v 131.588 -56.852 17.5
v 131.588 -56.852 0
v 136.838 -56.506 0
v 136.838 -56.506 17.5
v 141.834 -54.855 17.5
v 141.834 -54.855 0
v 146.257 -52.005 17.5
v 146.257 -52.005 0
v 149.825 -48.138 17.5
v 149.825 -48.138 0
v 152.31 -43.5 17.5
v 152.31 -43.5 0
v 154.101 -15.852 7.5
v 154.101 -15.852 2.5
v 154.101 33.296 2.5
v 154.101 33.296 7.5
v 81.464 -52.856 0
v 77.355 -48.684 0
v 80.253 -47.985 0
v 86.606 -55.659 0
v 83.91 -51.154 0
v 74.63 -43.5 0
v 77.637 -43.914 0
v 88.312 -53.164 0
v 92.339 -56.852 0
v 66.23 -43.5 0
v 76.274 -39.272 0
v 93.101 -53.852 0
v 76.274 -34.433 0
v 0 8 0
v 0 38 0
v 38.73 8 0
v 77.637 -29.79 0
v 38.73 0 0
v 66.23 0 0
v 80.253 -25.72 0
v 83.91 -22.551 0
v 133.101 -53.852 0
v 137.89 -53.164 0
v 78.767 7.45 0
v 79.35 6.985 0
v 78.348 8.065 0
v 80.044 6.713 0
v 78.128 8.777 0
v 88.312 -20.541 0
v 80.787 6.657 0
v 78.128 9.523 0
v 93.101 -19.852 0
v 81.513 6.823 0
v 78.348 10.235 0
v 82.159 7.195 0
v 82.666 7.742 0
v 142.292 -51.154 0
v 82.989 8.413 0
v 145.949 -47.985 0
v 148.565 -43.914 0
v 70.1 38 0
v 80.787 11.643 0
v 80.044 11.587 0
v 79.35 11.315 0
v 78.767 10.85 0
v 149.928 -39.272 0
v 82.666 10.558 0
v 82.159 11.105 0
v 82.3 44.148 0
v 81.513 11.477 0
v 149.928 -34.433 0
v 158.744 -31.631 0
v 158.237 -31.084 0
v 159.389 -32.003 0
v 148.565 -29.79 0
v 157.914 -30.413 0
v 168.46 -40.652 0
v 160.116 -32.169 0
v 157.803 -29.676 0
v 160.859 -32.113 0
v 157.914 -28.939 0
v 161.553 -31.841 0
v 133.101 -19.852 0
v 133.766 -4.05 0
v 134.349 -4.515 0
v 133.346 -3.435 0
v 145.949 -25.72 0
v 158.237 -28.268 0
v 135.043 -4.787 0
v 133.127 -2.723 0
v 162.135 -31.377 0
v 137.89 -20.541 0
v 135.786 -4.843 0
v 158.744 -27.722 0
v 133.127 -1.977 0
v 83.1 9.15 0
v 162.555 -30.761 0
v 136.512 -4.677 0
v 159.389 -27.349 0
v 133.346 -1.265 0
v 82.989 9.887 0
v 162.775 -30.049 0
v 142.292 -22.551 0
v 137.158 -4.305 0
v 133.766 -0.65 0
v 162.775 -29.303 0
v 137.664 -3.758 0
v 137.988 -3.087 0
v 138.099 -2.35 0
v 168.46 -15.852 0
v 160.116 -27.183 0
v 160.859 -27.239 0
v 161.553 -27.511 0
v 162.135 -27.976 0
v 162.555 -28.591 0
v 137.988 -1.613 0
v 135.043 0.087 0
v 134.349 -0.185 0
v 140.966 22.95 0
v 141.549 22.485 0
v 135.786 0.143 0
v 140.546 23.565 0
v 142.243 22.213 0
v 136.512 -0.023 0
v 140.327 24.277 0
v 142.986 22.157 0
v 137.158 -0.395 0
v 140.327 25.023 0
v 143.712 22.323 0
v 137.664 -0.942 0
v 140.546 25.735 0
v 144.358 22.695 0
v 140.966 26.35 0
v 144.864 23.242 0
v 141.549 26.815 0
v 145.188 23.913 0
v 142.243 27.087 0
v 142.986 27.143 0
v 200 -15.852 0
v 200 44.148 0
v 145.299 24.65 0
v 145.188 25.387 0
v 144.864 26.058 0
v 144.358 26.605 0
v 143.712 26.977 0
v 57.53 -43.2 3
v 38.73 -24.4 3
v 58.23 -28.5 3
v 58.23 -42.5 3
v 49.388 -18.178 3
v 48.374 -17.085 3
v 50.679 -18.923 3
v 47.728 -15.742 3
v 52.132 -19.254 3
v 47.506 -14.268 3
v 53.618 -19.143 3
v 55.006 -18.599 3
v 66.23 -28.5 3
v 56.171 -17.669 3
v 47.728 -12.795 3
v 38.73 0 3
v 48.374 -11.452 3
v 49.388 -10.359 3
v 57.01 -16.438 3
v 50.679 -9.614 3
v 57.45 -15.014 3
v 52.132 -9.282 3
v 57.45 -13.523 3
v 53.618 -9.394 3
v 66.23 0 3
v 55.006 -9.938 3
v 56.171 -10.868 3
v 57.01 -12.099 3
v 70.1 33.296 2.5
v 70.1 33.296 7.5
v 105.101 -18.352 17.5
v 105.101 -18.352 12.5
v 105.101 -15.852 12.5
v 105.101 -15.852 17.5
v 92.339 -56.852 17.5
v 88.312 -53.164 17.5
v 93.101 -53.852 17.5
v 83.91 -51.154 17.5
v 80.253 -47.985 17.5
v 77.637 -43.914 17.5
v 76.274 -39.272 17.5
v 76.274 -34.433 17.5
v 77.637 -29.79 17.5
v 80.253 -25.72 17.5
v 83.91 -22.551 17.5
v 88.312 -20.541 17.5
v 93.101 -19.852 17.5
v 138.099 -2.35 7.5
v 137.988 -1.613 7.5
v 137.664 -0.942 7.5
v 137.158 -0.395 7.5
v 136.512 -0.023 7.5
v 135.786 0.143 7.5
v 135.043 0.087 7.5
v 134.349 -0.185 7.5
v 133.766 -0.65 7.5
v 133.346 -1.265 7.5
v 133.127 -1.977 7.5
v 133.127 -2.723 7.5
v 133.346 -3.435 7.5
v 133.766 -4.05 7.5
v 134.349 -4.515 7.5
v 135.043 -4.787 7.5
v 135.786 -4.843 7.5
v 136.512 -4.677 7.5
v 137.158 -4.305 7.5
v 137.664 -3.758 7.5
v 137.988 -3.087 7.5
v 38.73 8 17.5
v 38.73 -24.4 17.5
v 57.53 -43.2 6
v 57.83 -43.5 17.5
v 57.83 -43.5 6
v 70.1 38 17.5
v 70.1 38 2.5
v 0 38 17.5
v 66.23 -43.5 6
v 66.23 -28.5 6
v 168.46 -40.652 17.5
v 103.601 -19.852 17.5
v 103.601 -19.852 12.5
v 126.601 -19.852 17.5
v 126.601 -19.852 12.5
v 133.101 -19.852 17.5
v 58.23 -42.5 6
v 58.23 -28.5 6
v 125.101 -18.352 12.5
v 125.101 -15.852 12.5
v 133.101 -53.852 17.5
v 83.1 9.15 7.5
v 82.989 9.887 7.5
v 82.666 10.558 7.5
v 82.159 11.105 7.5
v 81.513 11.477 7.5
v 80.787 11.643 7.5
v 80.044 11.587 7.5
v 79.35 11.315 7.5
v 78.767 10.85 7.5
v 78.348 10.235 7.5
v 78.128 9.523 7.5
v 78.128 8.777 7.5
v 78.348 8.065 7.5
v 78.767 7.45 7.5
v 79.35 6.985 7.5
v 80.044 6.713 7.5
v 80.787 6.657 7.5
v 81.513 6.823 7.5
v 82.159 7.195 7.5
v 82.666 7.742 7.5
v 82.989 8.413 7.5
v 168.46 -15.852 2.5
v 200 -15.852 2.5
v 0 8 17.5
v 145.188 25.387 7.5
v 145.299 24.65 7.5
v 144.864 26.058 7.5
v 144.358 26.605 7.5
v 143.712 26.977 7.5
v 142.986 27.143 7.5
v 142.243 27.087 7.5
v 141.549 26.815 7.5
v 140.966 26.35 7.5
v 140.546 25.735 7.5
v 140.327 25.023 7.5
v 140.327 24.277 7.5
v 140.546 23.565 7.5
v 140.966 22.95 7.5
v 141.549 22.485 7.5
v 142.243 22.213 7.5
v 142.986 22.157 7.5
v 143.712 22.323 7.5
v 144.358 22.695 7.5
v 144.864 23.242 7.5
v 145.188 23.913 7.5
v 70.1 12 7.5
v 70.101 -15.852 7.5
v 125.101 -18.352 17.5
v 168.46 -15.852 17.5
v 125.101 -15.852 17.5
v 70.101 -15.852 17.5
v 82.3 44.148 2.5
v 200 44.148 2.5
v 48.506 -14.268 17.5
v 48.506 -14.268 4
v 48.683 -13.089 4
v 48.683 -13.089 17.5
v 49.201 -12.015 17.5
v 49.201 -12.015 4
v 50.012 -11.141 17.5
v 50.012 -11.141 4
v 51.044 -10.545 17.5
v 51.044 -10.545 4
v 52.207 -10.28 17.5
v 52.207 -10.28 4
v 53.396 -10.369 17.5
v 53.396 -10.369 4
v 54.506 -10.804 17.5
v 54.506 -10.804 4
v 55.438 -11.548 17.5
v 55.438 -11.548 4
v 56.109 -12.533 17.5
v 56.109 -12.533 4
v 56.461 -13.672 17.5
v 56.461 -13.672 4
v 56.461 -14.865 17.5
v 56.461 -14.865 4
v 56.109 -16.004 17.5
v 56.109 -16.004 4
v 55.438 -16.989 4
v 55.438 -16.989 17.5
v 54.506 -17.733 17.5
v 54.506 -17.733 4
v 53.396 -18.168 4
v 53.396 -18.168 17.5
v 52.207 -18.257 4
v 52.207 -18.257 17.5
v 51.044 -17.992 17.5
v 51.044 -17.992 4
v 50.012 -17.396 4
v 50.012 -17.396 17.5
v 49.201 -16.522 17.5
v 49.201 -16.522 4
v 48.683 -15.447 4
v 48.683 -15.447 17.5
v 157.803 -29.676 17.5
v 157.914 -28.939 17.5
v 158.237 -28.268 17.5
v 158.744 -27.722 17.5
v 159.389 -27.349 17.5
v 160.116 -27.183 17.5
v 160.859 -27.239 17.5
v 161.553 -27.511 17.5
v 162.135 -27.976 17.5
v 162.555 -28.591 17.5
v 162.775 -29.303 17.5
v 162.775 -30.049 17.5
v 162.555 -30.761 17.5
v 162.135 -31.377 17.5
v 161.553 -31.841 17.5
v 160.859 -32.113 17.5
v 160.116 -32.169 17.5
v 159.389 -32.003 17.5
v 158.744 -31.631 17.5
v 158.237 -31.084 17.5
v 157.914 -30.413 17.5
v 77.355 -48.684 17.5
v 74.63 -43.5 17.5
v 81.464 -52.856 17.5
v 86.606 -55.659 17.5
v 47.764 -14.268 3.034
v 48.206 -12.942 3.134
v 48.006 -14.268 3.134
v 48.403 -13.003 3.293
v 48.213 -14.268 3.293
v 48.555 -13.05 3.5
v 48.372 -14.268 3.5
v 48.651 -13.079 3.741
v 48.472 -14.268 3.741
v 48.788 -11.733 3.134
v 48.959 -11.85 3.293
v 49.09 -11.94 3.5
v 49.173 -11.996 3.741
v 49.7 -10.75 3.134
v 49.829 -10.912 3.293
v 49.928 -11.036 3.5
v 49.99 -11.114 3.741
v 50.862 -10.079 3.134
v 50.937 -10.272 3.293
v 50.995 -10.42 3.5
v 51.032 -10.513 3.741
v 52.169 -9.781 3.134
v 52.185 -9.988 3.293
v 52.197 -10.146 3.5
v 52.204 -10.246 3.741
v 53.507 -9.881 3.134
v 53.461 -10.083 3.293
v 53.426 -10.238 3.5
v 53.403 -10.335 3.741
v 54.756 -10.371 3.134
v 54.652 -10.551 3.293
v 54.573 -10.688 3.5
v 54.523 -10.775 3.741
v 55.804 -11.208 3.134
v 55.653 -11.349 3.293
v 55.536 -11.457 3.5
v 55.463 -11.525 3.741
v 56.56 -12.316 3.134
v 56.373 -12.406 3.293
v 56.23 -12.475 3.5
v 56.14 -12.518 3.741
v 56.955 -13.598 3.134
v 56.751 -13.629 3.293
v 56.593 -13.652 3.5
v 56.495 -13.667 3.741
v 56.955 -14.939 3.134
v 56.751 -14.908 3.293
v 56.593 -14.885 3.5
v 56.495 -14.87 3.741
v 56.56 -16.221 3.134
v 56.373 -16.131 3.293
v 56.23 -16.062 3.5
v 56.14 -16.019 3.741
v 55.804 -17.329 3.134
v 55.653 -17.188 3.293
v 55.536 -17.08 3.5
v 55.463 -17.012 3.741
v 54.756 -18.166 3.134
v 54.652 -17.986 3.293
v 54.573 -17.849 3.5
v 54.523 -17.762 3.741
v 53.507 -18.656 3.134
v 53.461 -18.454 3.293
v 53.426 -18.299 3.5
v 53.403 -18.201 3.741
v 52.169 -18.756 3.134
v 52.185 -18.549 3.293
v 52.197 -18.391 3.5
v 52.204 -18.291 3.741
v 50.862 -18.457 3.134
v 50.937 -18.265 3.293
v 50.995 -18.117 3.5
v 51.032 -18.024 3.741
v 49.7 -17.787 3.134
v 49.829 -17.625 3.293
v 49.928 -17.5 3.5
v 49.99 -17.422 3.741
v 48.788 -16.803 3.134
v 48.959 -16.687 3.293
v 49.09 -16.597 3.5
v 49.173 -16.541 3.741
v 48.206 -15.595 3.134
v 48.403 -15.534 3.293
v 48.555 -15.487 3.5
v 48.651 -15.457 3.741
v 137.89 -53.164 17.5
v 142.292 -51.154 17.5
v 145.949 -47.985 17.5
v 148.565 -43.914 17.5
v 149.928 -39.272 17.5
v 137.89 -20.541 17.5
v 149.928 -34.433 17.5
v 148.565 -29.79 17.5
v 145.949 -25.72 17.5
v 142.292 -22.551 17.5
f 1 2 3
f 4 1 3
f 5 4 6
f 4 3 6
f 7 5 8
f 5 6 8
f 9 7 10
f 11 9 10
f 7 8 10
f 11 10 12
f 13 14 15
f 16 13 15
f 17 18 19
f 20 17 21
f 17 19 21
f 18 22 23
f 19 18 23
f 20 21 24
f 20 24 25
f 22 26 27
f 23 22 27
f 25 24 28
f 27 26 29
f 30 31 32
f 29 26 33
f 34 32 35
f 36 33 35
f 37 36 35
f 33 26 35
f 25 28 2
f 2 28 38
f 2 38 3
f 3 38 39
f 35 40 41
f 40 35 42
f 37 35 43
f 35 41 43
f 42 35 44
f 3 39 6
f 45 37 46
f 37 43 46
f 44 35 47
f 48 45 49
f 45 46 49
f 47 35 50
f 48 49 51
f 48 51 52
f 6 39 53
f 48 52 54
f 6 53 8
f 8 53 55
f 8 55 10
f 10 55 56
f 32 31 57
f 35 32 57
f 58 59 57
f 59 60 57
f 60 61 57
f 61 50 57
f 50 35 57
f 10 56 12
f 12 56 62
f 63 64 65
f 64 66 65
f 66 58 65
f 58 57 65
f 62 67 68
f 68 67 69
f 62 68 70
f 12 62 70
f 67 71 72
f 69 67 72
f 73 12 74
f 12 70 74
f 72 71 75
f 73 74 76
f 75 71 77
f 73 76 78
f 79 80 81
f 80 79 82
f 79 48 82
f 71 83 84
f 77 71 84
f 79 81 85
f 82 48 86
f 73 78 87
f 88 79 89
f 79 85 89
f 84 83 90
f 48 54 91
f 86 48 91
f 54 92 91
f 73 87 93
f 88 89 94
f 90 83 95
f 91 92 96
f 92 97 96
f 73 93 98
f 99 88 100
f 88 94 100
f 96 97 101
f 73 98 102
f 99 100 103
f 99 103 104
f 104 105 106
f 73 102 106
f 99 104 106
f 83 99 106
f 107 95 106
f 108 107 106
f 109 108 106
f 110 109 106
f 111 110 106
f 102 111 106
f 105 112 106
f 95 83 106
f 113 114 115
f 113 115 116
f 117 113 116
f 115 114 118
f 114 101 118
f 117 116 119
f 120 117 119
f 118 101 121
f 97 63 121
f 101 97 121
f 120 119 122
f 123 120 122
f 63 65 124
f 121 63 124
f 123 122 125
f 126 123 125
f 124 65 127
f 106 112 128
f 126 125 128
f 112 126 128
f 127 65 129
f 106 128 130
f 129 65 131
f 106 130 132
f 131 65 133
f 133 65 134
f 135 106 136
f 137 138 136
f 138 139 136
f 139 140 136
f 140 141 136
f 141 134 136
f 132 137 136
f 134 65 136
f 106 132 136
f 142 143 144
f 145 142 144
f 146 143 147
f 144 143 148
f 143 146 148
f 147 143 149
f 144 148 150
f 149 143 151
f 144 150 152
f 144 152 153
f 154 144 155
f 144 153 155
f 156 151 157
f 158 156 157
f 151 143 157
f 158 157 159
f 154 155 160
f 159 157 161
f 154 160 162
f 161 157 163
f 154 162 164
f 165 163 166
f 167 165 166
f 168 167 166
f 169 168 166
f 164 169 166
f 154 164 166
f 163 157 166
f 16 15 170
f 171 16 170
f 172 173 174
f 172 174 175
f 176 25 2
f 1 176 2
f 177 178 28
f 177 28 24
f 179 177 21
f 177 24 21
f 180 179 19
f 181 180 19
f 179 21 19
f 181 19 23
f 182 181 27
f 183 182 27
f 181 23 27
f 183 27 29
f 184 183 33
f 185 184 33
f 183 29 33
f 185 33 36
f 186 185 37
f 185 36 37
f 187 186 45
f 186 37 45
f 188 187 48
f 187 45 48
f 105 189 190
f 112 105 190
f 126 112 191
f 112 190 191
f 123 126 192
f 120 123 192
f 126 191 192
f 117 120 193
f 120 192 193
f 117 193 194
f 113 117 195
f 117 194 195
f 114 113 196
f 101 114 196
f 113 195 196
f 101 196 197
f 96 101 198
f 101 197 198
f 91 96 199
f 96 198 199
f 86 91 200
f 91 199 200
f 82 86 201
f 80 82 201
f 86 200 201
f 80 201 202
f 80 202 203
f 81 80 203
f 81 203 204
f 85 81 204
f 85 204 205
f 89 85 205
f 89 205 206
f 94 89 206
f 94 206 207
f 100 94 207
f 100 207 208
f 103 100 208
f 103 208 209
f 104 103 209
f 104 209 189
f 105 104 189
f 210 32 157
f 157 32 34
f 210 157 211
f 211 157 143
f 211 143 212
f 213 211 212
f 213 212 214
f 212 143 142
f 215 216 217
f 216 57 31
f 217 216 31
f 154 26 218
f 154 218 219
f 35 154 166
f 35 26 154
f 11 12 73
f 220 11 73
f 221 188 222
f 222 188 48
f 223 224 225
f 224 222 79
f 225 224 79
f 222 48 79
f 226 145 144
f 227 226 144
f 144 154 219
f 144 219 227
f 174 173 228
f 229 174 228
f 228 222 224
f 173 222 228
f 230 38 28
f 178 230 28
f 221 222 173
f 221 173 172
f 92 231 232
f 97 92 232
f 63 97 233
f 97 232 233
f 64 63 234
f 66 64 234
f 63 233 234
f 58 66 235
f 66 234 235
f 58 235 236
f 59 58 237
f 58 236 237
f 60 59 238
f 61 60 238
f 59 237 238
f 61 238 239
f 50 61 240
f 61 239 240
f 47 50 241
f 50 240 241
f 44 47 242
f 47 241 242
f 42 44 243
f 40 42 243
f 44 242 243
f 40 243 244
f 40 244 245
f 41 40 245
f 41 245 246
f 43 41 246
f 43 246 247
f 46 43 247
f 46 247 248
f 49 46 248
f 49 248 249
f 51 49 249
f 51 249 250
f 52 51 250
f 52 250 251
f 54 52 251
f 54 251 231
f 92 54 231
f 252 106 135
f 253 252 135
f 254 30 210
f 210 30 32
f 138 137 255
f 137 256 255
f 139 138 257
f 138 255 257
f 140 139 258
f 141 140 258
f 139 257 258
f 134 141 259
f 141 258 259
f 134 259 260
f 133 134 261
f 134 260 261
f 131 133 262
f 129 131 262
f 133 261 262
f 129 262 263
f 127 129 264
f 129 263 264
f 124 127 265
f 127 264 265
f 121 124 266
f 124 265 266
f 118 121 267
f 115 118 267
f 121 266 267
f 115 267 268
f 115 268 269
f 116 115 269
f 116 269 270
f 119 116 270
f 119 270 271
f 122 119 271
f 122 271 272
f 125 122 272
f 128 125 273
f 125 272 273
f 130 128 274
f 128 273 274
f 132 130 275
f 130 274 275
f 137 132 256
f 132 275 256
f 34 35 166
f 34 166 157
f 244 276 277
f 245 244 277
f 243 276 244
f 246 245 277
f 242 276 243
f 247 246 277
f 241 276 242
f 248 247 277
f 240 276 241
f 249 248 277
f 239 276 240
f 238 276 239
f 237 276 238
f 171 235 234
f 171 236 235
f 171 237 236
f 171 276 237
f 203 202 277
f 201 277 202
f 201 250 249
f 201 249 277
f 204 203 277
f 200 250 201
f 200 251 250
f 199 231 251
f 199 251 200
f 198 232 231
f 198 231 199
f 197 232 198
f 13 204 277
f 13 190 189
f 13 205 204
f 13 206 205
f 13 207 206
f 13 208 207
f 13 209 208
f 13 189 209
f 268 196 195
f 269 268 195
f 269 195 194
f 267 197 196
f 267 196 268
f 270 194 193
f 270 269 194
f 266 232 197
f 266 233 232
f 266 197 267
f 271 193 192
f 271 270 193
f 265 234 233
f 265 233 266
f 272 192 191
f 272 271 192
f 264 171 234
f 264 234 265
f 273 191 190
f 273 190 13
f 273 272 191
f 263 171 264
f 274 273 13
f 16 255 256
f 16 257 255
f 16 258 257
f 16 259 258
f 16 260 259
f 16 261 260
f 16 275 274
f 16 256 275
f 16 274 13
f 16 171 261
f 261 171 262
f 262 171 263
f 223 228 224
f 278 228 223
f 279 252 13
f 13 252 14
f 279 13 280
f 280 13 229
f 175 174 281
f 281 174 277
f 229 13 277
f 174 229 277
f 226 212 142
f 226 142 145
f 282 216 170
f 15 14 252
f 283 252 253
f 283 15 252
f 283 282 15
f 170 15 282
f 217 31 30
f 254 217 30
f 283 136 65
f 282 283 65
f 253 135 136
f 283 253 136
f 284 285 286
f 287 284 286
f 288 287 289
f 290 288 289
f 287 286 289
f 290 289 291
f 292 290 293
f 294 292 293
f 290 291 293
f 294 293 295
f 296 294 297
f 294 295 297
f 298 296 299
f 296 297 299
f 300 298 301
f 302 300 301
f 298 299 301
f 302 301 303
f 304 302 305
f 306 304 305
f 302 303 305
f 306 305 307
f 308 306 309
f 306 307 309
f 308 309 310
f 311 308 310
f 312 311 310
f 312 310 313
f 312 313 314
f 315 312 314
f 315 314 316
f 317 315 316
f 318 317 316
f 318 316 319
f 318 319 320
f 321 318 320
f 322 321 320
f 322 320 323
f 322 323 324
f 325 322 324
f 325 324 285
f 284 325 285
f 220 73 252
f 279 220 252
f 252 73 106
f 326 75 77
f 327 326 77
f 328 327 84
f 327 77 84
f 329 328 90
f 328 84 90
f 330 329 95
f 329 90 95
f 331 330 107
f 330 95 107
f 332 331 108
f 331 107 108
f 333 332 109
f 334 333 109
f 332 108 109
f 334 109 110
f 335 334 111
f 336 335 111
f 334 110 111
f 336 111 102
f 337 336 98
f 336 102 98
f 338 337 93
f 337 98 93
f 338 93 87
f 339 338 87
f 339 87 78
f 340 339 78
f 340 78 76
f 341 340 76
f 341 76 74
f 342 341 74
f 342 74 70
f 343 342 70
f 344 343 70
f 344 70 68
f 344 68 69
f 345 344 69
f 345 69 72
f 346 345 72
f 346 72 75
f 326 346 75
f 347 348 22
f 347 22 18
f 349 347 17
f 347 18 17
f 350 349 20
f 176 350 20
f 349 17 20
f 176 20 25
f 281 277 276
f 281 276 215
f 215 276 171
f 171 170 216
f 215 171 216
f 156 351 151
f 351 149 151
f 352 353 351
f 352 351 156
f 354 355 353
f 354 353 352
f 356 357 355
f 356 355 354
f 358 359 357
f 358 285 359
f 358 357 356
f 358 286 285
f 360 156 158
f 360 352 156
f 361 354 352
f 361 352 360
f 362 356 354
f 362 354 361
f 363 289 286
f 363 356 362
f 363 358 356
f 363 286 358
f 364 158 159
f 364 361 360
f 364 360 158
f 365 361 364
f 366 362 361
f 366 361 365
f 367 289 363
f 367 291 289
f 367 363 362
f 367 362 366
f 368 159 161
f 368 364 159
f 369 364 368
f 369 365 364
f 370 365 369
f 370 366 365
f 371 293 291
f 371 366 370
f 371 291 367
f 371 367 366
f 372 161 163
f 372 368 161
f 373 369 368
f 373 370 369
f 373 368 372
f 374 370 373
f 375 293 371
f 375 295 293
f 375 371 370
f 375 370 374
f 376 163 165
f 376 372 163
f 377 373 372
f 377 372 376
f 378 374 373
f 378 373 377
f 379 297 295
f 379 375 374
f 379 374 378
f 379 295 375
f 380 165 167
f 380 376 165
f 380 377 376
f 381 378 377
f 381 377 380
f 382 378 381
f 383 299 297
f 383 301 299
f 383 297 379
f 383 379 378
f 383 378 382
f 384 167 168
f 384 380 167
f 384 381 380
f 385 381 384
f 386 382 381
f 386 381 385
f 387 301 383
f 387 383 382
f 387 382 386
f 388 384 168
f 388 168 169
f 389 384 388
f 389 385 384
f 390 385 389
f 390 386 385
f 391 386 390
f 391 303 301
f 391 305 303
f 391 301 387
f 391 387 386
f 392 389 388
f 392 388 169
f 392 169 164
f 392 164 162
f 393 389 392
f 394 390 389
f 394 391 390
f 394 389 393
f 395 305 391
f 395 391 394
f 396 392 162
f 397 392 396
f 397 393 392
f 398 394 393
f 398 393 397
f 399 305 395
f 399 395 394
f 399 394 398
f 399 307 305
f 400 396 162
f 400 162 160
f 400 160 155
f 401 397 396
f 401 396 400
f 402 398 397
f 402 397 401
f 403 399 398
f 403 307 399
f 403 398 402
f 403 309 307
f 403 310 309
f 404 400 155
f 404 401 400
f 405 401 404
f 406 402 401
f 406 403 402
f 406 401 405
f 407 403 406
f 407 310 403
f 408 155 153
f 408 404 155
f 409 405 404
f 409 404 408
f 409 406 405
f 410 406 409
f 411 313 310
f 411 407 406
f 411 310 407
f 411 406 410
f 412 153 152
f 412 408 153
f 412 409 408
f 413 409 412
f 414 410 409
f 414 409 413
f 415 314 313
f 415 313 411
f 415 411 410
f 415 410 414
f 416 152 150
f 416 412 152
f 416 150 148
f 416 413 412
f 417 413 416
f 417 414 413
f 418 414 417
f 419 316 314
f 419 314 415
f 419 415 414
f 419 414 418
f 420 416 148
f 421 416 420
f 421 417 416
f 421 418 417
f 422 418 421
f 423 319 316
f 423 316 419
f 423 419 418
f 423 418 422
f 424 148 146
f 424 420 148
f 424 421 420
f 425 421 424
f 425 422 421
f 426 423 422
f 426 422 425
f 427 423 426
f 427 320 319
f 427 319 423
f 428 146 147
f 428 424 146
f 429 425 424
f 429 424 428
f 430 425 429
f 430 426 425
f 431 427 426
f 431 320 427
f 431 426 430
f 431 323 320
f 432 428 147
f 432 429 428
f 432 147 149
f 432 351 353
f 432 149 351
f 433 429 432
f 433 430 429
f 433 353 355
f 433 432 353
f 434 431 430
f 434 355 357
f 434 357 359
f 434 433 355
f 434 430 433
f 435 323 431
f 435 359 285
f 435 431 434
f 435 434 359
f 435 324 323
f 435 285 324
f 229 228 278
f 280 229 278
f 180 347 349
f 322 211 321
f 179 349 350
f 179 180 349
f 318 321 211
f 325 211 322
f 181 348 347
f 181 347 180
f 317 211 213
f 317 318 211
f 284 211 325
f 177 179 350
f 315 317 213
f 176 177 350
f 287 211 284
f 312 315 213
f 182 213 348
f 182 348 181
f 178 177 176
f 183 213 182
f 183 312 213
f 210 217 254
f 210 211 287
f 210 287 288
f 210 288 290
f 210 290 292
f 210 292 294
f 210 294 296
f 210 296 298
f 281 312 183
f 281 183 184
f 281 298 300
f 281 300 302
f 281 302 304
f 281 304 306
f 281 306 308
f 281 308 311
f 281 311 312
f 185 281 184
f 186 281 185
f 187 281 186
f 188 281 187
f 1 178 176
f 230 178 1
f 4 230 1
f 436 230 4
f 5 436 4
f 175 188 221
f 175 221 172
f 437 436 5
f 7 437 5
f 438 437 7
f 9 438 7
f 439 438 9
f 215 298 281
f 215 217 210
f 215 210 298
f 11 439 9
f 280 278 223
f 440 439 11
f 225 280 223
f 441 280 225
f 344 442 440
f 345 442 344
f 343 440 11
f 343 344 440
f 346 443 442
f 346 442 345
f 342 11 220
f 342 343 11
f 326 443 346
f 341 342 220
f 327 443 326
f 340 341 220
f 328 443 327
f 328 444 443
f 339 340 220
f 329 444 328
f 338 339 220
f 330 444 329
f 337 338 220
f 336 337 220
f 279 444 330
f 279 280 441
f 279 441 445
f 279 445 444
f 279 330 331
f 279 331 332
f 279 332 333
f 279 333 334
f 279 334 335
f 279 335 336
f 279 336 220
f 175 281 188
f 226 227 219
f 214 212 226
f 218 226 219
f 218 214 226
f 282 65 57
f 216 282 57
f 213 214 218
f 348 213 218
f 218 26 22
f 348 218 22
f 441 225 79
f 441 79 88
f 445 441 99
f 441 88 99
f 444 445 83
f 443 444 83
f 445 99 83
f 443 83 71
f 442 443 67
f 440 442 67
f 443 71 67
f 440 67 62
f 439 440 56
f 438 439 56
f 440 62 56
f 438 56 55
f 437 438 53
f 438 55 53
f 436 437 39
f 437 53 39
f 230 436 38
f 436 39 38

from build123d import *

# Parameters (mm, degrees)
EXTRUDE_1_DEPTH     = 2.5
EXTRUDE_2_DEPTH     = 17.5
CUT_EXTRUDE_2_REACH = 212.718
SKETCH_5_W          = 20
SKETCH_5_H          = 5
CHAMFER_1_SIZE      = 1.5
EXTRUDE_3_DEPTH     = 7.5
CUT_EXTRUDE_3_DEPTH = 3
SKETCH_13_R         = 2.5
CUT_EXTRUDE_4_DEPTH = 10
SKETCH_14_W         = 8
SKETCH_14_H         = 15
CUT_EXTRUDE_5_DEPTH = 3
CHAMFER_2_SIZE      = 1
CUT_EXTRUDE_6_REACH = 210.439
SKETCH_15_R         = 4
FILLET_1_R          = 1
CUT_EXTRUDE_7_REACH = 210.669
SKETCH_18_R         = 2.5


with BuildPart() as part:
    # 스케치2 → 보스-돌출1 (new body)
    with BuildSketch(Plane.XY):
        with BuildLine():
            Line((70.1, 38), (0, 38))
            Line((0, 38), (0, 8))
            Line((0, 8), (38.730142729, 8))
            Line((38.730142729, 8), (38.730142729, -24.4))
            Line((38.730142729, -24.4), (57.830142729, -43.5))
            Line((57.830142729, -43.5), (74.630142729, -43.5))
            ThreePointArc((74.630142729, -43.5), (81.464191763, -52.855667895), (92.338911336, -56.852319262))
            Line((92.338911336, -56.852319262), (131.588043415, -56.852319262))
            ThreePointArc((131.588043415, -56.852319262), (144.135794003, -53.569804808), (152.310142729, -43.5))
            Line((152.310142729, -43.5), (168.460142729, -40.652319262))
            Line((168.460142729, -40.652319262), (168.460142729, -15.852319262))
            Line((168.460142729, -15.852319262), (200, -15.852319262))
            Line((200, -15.852319262), (200, 44.147680738))
            Line((200, 44.147680738), (82.3, 44.147680738))
            Line((82.3, 44.147680738), (70.1, 38))
        make_face()
        with BuildLine():
            Line((93.10095722, -19.852319262), (133.10095722, -19.852319262))
            ThreePointArc((133.10095722, -19.852319262), (150.10095722, -36.852319262), (133.10095722, -53.852319262))
            Line((133.10095722, -53.852319262), (93.10095722, -53.852319262))
            ThreePointArc((93.10095722, -53.852319262), (76.10095722, -36.852319262), (93.10095722, -19.852319262))
        make_face(mode=Mode.SUBTRACT)
    extrude(amount=EXTRUDE_1_DEPTH)

    # 스케치2<3> → 보스-돌출2 (add)
    with BuildSketch(Plane.XY):
        with BuildLine():
            Line((70.1, 38), (0, 38))
            Line((0, 38), (0, 8))
            Line((0, 8), (38.730142729, 8))
            Line((38.730142729, 8), (38.730142729, -24.4))
            Line((38.730142729, -24.4), (57.830142729, -43.5))
            Line((57.830142729, -43.5), (74.630142729, -43.5))
            ThreePointArc((74.630142729, -43.5), (81.464191763, -52.855667895), (92.338911336, -56.852319262))
            Line((92.338911336, -56.852319262), (131.588043415, -56.852319262))
            ThreePointArc((131.588043415, -56.852319262), (144.135794003, -53.569804808), (152.310142729, -43.5))
            Line((152.310142729, -43.5), (168.460142729, -40.652319262))
            Line((168.460142729, -40.652319262), (168.460142729, -15.852319262))
            Line((168.460142729, -15.852319262), (70.10095722, -15.852319262))
            Line((70.10095722, -15.852319262), (70.1, 38))
        make_face()
        with BuildLine():
            Line((93.10095722, -19.852319262), (133.10095722, -19.852319262))
            ThreePointArc((133.10095722, -19.852319262), (150.10095722, -36.852319262), (133.10095722, -53.852319262))
            Line((133.10095722, -53.852319262), (93.10095722, -53.852319262))
            ThreePointArc((93.10095722, -53.852319262), (76.10095722, -36.852319262), (93.10095722, -19.852319262))
        make_face(mode=Mode.SUBTRACT)
    extrude(amount=EXTRUDE_2_DEPTH)

    # 스케치5 → 컷-돌출2 (cut, up to next)
    with BuildSketch(Plane.XZ.offset(19.852319262), mode=Mode.PRIVATE) as cut_extrude_2_sk1:
        with Locations((115.10095722, 15)):
            Rectangle(SKETCH_5_W, SKETCH_5_H)
    cut_extrude_2_tool1 = extrude(cut_extrude_2_sk1.sketch, amount=-CUT_EXTRUDE_2_REACH, mode=Mode.PRIVATE) & part.part
    add(cut_extrude_2_tool1.solids().sort_by_distance((115.100957, -19.852319, 15))[0], mode=Mode.SUBTRACT)

    # 모따기1
    chamfer_1_edges = [part.edges().sort_by_distance(p)[0] for p in [
        (125.10095722, -19.852319262, 15),
        (105.10095722, -19.852319262, 15),
    ]]
    chamfer(chamfer_1_edges, length=CHAMFER_1_SIZE)

    # 스케치2<4> → 보스-돌출3 (add)
    with BuildSketch(Plane.XY):
        Polygon((154.10095722, 33.295670157), (70.100083619, 33.295670157), (70.100462148, 12), (70.10095722, -15.852319262), (154.10095722, -15.852319262), align=None)
    extrude(amount=EXTRUDE_3_DEPTH)

    # 스케치2<5> → 컷-돌출3 (cut)
    with BuildSketch(Plane.XY):
        Polygon((66.230142729, 0), (38.730142729, 0), (38.730142729, -24.4), (57.830142729, -43.5), (66.230142729, -43.5), align=None)
    extrude(amount=CUT_EXTRUDE_3_DEPTH, mode=Mode.SUBTRACT)

    # 스케치13 → 컷-돌출4 (cut, symmetric)
    with BuildSketch(Plane.XY.offset(7.5)):
        with Locations((80.6, 9.15)):
            Circle(SKETCH_13_R)
        with Locations((135.59886794, -2.35)):
            Circle(SKETCH_13_R)
        with Locations((142.79886794, 24.65)):
            Circle(SKETCH_13_R)
    extrude(amount=CUT_EXTRUDE_4_DEPTH, both=True, mode=Mode.SUBTRACT)

    # 스케치14 → 컷-돌출5 (cut)
    with BuildSketch(Plane(origin=(0, 0, 3), x_dir=(-1, 0, 0), z_dir=(0, 0, -1))):
        with Locations((-62.230142729, -36)):
            Rectangle(SKETCH_14_W, SKETCH_14_H)
    extrude(amount=-CUT_EXTRUDE_5_DEPTH, mode=Mode.SUBTRACT)

    # 모따기2
    # the kernel refuses this chamfer: 1 mm, written as the material it takes off along each edge
    with BuildSketch(Plane(origin=(58.230142729, -43.5, 0.428317012), x_dir=(-0.9996219169112968, -0.027495876610589005, 0), z_dir=(0, 0, 1))) as chamfer_2_piece_1:
        Polygon((CHAMFER_2_SIZE * 0.999621916911, -CHAMFER_2_SIZE * 0.0274958766106), (-CHAMFER_2_SIZE * 0.0274958766106, -CHAMFER_2_SIZE * 0.999621916911), (0, 0), align=None)
    extrude(amount=5.571682988, mode=Mode.SUBTRACT)

    # 스케치15 → 컷-돌출6 (cut, up to next)
    with BuildSketch(Plane(origin=(0, 0, 3), x_dir=(-1, 0, 0), z_dir=(0, 0, -1)), mode=Mode.PRIVATE) as cut_extrude_6_sk1:
        with Locations((-52.505609521, -14.268427339)):
            Circle(SKETCH_15_R)
    cut_extrude_6_tool1 = extrude(cut_extrude_6_sk1.sketch, amount=-CUT_EXTRUDE_6_REACH, mode=Mode.PRIVATE) & part.part
    add(cut_extrude_6_tool1.solids().sort_by_distance((52.50561, -14.268427, 3))[0], mode=Mode.SUBTRACT)

    # 필렛1
    fillet_1_edges = [part.edges().sort_by_distance(p)[0] for p in [
        (56.505609521, -14.268427339, 3),
    ]]
    fillet(fillet_1_edges, radius=FILLET_1_R)

    # 스케치18 → 컷-돌출7 (cut, up to next)
    with BuildSketch(Plane(origin=(0, 0, 0), x_dir=(-1, 0, 0), z_dir=(0, 0, -1)), mode=Mode.PRIVATE) as cut_extrude_7_sk1:
        with Locations((-160.302780776, -29.676087823)):
            Circle(SKETCH_18_R)
    cut_extrude_7_tool1 = extrude(cut_extrude_7_sk1.sketch, amount=-CUT_EXTRUDE_7_REACH, mode=Mode.PRIVATE) & part.part
    add(cut_extrude_7_tool1.solids().sort_by_distance((160.302781, -29.676088, 0))[0], mode=Mode.SUBTRACT)


solid = part.part
